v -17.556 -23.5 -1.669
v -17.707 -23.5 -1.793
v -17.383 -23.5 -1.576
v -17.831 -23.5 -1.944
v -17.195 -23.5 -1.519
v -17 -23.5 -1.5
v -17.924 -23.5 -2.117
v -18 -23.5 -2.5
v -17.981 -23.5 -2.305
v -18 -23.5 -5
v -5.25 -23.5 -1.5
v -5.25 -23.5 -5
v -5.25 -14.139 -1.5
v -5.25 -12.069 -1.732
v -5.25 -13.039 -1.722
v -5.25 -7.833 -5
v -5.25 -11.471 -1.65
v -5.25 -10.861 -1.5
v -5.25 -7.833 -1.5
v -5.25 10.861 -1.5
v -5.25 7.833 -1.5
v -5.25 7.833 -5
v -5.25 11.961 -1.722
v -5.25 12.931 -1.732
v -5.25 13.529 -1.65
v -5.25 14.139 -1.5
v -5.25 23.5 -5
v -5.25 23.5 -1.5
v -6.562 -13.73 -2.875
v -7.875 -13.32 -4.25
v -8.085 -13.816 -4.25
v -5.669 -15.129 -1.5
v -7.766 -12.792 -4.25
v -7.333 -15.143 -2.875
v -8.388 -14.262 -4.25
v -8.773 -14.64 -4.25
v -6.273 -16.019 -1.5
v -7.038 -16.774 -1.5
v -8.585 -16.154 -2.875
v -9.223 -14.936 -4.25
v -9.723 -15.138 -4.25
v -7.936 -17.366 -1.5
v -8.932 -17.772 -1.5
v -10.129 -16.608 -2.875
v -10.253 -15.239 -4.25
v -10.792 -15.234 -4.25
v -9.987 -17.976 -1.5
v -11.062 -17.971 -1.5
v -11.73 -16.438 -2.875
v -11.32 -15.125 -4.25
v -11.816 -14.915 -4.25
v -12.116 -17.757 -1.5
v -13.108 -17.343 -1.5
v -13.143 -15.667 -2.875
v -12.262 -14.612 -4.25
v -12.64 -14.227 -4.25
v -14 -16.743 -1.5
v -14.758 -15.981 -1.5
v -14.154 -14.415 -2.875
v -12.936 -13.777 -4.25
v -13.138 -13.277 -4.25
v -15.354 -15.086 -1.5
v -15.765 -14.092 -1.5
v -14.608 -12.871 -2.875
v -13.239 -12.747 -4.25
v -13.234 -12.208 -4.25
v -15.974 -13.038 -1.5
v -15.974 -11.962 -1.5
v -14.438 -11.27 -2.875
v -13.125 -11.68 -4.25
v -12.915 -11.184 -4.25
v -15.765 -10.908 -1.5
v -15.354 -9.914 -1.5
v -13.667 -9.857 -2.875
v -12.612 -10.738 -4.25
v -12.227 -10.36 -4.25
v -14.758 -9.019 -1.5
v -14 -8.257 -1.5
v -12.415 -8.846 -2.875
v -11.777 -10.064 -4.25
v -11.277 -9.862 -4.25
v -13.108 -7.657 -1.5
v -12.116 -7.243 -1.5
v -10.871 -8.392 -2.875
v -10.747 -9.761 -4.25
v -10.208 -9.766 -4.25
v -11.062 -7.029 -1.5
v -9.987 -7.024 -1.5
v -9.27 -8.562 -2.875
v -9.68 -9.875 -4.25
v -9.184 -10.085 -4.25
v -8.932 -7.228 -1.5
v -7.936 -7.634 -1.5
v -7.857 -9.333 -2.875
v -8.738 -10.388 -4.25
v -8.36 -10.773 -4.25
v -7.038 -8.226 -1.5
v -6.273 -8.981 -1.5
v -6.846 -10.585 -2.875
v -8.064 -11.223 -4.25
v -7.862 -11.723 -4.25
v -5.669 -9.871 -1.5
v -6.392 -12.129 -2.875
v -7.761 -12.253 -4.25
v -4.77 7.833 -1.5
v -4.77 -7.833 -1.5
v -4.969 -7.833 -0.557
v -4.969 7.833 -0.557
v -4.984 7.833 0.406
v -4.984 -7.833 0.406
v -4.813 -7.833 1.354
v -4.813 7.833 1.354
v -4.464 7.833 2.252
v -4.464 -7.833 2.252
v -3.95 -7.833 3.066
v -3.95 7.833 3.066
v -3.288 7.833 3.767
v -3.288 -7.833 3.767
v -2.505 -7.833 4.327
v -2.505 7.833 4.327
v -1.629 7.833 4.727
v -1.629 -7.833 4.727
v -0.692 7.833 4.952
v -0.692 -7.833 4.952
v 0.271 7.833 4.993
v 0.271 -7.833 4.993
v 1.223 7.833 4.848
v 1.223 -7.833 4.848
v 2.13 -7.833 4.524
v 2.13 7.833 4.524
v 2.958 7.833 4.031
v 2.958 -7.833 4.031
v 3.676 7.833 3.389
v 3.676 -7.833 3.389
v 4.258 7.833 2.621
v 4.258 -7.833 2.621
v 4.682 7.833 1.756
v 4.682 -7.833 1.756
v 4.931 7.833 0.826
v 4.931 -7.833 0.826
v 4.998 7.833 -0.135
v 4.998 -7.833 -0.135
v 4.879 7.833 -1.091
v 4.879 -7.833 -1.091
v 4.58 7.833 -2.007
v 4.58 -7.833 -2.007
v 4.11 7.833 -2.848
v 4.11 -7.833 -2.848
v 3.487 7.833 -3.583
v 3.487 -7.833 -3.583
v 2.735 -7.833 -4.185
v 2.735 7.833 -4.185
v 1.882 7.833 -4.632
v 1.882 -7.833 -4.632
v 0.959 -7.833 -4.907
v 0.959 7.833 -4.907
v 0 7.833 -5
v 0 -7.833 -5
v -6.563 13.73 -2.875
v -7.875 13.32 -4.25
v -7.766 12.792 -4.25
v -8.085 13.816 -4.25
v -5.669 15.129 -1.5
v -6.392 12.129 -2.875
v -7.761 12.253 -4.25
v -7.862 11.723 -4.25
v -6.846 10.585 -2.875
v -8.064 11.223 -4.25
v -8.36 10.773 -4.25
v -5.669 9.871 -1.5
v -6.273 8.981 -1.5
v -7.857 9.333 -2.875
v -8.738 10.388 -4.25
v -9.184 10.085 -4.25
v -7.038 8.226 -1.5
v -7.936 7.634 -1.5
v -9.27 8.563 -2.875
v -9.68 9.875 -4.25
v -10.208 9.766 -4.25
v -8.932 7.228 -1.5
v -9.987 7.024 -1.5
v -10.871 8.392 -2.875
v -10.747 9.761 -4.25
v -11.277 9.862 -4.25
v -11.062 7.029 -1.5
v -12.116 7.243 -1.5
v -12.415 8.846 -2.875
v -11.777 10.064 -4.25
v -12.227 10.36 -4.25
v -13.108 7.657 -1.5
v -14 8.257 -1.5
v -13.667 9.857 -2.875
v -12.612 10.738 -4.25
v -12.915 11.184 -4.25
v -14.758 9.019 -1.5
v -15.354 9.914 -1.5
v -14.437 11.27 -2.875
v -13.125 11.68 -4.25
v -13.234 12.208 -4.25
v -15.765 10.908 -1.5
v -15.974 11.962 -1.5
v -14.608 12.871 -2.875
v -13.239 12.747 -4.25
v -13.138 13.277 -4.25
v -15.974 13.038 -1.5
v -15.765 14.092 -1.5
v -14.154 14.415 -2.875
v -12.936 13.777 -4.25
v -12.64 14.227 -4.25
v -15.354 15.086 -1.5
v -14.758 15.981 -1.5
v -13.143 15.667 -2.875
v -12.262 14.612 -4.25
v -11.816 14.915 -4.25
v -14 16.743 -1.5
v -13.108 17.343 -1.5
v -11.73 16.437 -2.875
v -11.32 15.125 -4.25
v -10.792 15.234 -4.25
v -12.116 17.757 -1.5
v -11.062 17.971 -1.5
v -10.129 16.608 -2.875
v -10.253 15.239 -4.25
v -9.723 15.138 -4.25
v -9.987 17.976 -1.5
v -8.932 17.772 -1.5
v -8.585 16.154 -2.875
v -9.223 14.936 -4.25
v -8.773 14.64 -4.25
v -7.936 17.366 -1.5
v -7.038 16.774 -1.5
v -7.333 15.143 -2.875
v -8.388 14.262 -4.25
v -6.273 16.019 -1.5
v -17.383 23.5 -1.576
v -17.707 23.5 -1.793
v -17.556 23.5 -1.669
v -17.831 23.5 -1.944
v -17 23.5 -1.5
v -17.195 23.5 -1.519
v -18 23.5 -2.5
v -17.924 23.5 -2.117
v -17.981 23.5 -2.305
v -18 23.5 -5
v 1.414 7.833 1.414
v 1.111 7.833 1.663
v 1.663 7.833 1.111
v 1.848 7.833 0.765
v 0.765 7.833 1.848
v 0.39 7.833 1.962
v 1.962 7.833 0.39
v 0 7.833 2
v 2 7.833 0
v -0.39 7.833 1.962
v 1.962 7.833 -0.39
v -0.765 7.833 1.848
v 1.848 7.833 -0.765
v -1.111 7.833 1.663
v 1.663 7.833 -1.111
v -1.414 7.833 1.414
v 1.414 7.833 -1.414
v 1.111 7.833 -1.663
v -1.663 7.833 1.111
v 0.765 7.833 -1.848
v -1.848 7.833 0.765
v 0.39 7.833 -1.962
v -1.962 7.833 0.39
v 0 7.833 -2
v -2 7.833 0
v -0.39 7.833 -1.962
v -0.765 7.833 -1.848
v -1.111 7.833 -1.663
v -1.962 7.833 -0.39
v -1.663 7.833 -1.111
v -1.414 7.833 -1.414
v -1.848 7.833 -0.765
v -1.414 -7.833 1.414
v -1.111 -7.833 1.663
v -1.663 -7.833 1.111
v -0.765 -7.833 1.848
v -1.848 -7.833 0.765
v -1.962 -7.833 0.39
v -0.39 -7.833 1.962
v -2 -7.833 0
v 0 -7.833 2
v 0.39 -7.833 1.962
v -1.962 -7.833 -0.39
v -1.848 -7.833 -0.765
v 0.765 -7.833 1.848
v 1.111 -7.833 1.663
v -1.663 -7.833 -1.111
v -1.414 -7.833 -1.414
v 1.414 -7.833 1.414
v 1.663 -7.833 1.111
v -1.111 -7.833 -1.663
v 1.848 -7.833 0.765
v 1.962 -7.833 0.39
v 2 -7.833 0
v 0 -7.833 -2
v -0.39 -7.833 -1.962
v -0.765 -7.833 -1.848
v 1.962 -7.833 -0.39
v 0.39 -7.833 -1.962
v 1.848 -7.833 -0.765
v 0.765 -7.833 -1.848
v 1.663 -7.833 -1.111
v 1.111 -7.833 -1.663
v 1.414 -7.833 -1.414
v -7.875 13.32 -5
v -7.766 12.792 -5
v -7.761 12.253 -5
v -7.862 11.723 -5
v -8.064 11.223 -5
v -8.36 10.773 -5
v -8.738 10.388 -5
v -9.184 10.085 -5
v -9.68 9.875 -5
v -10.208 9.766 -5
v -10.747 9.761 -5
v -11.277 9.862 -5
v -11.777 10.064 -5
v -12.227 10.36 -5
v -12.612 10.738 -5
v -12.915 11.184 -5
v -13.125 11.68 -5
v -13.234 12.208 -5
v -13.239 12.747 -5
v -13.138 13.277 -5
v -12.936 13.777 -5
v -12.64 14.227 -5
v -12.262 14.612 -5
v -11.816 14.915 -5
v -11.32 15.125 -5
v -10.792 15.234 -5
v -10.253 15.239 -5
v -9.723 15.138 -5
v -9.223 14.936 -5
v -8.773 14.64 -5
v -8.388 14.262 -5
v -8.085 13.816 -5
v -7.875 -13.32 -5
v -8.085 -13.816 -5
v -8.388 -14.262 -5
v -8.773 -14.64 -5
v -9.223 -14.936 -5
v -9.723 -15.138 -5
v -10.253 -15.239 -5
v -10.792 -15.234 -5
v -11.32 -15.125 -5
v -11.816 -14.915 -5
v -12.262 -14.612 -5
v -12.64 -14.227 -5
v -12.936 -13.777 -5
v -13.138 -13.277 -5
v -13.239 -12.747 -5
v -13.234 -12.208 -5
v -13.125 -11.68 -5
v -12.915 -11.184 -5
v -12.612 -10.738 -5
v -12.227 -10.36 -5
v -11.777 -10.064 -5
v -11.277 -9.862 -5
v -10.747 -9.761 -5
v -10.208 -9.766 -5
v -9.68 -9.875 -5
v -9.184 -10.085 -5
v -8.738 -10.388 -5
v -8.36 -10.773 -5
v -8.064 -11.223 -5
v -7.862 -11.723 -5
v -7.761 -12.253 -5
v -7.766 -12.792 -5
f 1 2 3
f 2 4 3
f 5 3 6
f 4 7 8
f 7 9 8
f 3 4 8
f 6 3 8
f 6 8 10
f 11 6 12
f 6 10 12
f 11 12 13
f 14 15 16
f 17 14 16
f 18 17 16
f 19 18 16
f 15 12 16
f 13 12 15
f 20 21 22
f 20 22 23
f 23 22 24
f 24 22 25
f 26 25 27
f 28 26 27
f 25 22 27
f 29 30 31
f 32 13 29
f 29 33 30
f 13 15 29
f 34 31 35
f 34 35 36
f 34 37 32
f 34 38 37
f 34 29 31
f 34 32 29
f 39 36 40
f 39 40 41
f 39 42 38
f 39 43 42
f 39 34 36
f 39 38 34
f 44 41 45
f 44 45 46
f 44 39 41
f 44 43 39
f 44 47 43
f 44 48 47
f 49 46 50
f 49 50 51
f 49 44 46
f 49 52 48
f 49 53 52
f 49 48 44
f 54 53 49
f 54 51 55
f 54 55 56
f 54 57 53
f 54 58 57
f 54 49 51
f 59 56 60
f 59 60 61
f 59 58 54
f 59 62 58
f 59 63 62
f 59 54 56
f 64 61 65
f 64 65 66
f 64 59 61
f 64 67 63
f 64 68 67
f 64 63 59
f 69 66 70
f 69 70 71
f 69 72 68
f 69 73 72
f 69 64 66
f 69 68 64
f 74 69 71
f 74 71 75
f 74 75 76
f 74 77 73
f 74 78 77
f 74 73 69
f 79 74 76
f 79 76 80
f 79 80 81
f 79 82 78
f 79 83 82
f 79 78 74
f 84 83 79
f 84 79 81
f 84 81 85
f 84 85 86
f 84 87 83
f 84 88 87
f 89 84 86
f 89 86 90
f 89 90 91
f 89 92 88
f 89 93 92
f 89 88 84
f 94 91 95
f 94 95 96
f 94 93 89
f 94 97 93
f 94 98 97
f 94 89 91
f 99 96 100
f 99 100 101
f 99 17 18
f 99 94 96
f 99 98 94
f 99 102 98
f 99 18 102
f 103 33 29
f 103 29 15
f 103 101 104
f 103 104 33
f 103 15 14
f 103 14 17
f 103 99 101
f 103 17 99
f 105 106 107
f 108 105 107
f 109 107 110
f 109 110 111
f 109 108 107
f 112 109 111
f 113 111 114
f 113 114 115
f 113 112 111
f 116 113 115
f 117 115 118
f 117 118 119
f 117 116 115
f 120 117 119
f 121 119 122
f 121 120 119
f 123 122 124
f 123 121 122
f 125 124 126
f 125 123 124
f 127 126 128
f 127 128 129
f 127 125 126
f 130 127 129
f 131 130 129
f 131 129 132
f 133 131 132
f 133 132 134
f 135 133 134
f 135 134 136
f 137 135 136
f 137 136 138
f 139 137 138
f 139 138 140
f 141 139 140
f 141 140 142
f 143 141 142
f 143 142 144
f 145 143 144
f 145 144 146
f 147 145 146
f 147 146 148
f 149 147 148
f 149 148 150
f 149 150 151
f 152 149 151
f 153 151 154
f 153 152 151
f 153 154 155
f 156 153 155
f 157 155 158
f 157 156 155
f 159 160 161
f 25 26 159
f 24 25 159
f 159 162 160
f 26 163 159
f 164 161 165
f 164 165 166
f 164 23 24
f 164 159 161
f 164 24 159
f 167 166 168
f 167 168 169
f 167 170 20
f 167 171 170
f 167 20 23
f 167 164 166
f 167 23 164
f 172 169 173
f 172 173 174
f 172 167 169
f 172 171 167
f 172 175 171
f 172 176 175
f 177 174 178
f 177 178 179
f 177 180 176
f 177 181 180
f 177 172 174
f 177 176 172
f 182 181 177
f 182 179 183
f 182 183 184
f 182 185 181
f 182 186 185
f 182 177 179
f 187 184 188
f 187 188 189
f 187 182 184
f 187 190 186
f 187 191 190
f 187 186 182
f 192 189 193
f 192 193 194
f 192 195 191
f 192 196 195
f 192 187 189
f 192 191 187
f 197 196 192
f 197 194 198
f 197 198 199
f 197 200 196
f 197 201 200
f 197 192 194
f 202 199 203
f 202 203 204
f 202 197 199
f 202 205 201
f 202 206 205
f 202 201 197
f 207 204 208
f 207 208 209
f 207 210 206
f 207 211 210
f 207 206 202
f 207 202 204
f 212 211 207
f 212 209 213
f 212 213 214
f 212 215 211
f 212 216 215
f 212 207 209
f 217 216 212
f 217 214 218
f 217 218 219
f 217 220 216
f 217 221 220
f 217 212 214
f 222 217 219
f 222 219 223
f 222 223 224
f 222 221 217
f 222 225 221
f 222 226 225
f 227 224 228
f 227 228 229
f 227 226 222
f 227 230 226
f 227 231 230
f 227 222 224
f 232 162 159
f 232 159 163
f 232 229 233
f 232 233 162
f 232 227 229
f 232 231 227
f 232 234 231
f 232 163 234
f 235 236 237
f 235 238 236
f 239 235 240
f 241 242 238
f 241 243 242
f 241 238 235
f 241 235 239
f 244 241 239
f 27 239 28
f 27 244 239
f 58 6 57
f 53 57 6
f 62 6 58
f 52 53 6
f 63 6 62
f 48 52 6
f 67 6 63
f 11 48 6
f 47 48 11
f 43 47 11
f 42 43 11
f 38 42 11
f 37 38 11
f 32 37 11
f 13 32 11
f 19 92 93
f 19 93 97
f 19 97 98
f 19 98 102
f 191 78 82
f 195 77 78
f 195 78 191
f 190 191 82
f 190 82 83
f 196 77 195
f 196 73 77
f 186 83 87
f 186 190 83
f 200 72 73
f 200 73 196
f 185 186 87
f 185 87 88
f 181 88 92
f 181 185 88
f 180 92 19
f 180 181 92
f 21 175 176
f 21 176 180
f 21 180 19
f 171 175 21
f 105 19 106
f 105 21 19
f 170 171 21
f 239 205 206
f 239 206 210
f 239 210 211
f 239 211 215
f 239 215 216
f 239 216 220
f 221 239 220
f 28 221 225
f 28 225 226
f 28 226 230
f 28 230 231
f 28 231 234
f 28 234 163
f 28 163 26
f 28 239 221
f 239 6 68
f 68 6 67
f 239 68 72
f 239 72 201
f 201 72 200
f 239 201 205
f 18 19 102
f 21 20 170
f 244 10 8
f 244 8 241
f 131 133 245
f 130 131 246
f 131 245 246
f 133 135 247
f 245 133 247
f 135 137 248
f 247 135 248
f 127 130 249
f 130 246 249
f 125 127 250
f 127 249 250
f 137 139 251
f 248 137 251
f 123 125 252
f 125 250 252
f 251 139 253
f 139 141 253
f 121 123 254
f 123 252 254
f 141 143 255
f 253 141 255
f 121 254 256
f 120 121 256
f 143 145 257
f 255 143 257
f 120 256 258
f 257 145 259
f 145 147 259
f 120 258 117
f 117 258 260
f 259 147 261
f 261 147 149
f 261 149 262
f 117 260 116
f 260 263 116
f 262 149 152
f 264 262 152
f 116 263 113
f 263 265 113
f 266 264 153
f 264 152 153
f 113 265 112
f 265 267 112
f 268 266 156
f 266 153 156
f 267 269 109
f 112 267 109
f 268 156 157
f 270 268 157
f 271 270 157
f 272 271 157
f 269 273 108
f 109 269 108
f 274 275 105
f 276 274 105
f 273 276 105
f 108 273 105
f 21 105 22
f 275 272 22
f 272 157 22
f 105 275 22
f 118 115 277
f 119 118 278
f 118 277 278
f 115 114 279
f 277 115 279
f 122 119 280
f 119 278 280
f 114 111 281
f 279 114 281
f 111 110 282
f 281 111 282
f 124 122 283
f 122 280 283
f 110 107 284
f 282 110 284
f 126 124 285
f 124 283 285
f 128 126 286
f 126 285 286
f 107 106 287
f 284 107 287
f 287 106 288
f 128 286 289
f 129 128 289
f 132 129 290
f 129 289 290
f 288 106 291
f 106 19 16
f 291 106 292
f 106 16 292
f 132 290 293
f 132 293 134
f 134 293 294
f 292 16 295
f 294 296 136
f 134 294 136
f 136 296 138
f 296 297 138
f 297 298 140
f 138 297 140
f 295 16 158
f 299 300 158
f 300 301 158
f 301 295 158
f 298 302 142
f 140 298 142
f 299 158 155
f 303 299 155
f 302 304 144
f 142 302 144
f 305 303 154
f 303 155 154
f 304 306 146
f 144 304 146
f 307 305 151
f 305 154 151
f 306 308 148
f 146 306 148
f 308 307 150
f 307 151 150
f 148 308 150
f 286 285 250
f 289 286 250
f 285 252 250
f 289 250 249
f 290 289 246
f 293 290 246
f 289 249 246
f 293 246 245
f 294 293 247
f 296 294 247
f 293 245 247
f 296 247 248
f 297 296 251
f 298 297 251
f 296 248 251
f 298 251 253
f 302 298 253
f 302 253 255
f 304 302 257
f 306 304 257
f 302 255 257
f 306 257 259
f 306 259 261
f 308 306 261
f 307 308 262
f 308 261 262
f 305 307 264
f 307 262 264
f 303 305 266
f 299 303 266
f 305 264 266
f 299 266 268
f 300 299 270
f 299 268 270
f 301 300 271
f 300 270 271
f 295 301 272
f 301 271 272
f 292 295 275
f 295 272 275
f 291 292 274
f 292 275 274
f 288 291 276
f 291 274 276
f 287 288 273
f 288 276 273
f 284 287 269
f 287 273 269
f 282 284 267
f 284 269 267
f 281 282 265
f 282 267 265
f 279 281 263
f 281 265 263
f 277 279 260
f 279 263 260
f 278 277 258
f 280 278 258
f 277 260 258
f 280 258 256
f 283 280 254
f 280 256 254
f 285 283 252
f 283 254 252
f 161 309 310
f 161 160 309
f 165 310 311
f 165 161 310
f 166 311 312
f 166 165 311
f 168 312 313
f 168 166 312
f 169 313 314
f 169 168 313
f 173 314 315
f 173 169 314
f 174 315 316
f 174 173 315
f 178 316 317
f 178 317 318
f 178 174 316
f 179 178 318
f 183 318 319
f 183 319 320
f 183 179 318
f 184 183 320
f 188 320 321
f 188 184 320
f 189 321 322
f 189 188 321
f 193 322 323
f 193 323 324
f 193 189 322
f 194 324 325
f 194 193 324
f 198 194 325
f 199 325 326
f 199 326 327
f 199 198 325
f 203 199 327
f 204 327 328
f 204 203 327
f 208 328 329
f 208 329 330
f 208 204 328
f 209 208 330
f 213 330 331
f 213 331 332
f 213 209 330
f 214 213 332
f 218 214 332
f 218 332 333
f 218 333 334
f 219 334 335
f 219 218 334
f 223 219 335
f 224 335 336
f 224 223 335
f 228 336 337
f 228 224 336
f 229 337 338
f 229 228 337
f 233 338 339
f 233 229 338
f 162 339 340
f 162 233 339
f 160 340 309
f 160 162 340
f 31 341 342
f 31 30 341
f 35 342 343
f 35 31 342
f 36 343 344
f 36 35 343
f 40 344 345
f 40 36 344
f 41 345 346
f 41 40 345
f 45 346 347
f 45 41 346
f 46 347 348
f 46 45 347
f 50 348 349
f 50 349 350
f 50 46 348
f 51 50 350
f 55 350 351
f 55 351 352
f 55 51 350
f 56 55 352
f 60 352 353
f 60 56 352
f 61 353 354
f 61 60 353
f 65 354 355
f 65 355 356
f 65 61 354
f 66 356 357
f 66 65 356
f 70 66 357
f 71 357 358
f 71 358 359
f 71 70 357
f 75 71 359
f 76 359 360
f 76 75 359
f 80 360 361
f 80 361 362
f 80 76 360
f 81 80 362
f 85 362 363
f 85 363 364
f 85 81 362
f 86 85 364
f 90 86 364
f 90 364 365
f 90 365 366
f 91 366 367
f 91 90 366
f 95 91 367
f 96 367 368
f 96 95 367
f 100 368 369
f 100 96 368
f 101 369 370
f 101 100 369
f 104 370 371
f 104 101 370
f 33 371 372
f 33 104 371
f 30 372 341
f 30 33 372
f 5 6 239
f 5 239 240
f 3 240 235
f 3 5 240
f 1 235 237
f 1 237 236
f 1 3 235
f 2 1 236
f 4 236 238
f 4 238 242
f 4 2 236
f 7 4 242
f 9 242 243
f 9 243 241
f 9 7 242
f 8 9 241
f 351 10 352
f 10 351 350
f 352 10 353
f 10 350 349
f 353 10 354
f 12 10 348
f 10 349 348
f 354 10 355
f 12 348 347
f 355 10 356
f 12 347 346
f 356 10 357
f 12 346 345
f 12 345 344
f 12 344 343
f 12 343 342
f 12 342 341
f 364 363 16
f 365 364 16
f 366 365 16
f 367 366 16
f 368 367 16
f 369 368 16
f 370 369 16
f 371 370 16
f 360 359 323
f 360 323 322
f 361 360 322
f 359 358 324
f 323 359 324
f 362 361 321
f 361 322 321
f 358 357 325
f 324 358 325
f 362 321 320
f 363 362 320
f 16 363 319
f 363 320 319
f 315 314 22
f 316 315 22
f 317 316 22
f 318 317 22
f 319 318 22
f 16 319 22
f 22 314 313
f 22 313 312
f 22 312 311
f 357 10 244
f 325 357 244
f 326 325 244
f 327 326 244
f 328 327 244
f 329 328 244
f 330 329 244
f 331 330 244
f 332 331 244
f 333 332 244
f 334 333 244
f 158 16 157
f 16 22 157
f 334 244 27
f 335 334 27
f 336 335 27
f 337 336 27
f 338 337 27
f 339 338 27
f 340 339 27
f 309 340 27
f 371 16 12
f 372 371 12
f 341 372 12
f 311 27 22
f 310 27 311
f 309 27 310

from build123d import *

# Parameters (mm, degrees)
SKETCH1_W               = 5
SKETCH1_H               = 47
SKETCH2_W               = 18
SKETCH2_H               = 47
BOSS_EXTRUDE1_DEPTH     = 3.5
CUT_EXTRUDE1_DEPTH      = 47
CUT_EXTRUDE1_DEPTH_BACK = 47
SKETCH3_W               = 94
SKETCH3_H               = 94
SKETCH4_W               = 2
SKETCH4_H               = 53.4
CUT_EXTRUDE2_DEPTH      = 23.5
CUT_EXTRUDE2_DEPTH_BACK = 23.5


with BuildPart() as part:
    # Sketch1 → Revolve1 (revolve)
    with BuildSketch(Plane.XY):
        with Locations((2.5, 0)):
            Rectangle(SKETCH1_W, SKETCH1_H)
    revolve(axis=Axis((0, -23.5, 0), (0, 1, 0)))

    # Sketch2 → Boss-Extrude1 (add)
    with BuildSketch(Plane.XY.offset(-5)):
        with Locations((-9, 0)):
            Rectangle(SKETCH2_W, SKETCH2_H)
    extrude(amount=BOSS_EXTRUDE1_DEPTH)

    # Sketch3 → Cut-Extrude1 (cut, two sides: drawn at the far end of the back side and taken through both)
    with BuildSketch(Plane.XY.offset(-CUT_EXTRUDE1_DEPTH_BACK)):
        Rectangle(SKETCH3_W, SKETCH3_H)
        Polygon((-18, -23.5), (-5.25, -23.5), (-5.25, -7.833333333), (5, -7.833333333), (5, 7.833333333), (-5.25, 7.833333333), (-5.25, 23.5), (-18, 23.5), align=None, mode=Mode.SUBTRACT)
    extrude(amount=CUT_EXTRUDE1_DEPTH + CUT_EXTRUDE1_DEPTH_BACK, mode=Mode.SUBTRACT)

    # Sketch4 → Cut-Revolve1 (revolve, cut)
    with BuildSketch(Plane.XY):
        with Locations((1, 0)):
            Rectangle(SKETCH4_W, SKETCH4_H)
    revolve(axis=Axis((0, -26.7, 0), (0, 1, 0)), mode=Mode.SUBTRACT)

    # Sketch5 → Cut-Revolve2 (revolve, cut)
    with BuildSketch(Plane(origin=(-10.5, 0, 0), x_dir=(0, 0, -1), z_dir=(1, 0, 0))):
        Polygon((5, -12.5), (5, -15.25), (4.25, -15.25), (1.5, -18), (1.5, -12.5), align=None)
    revolve(axis=Axis((-10.5, -12.5, -1.5), (0, 0, -1)), mode=Mode.SUBTRACT)

    # Sketch6 → Cut-Revolve3 (revolve, cut)
    with BuildSketch(Plane(origin=(-10.5, 0, 0), x_dir=(0, 0, -1), z_dir=(1, 0, 0))):
        Polygon((5, 12.5), (5, 9.75), (4.25, 9.75), (1.5, 7), (1.5, 12.5), align=None)
    revolve(axis=Axis((-10.5, 12.5, -1.5), (0, 0, -1)), mode=Mode.SUBTRACT)

    # Sketch7 → Cut-Extrude2 (cut, two sides: drawn at the far end of the back side and taken through both)
    with BuildSketch(Plane(origin=(0, 0, 0), x_dir=(1, 0, 0), z_dir=(0, 1, 0)).offset(-CUT_EXTRUDE2_DEPTH_BACK)):
        with BuildLine():
            Line((-18, 1.5), (-17, 1.5))
            ThreePointArc((-17, 1.5), (-17.707106781, 1.792893219), (-18, 2.5))
            Line((-18, 2.5), (-18, 1.5))
        make_face()
    extrude(amount=CUT_EXTRUDE2_DEPTH + CUT_EXTRUDE2_DEPTH_BACK, mode=Mode.SUBTRACT)


solid = part.part
